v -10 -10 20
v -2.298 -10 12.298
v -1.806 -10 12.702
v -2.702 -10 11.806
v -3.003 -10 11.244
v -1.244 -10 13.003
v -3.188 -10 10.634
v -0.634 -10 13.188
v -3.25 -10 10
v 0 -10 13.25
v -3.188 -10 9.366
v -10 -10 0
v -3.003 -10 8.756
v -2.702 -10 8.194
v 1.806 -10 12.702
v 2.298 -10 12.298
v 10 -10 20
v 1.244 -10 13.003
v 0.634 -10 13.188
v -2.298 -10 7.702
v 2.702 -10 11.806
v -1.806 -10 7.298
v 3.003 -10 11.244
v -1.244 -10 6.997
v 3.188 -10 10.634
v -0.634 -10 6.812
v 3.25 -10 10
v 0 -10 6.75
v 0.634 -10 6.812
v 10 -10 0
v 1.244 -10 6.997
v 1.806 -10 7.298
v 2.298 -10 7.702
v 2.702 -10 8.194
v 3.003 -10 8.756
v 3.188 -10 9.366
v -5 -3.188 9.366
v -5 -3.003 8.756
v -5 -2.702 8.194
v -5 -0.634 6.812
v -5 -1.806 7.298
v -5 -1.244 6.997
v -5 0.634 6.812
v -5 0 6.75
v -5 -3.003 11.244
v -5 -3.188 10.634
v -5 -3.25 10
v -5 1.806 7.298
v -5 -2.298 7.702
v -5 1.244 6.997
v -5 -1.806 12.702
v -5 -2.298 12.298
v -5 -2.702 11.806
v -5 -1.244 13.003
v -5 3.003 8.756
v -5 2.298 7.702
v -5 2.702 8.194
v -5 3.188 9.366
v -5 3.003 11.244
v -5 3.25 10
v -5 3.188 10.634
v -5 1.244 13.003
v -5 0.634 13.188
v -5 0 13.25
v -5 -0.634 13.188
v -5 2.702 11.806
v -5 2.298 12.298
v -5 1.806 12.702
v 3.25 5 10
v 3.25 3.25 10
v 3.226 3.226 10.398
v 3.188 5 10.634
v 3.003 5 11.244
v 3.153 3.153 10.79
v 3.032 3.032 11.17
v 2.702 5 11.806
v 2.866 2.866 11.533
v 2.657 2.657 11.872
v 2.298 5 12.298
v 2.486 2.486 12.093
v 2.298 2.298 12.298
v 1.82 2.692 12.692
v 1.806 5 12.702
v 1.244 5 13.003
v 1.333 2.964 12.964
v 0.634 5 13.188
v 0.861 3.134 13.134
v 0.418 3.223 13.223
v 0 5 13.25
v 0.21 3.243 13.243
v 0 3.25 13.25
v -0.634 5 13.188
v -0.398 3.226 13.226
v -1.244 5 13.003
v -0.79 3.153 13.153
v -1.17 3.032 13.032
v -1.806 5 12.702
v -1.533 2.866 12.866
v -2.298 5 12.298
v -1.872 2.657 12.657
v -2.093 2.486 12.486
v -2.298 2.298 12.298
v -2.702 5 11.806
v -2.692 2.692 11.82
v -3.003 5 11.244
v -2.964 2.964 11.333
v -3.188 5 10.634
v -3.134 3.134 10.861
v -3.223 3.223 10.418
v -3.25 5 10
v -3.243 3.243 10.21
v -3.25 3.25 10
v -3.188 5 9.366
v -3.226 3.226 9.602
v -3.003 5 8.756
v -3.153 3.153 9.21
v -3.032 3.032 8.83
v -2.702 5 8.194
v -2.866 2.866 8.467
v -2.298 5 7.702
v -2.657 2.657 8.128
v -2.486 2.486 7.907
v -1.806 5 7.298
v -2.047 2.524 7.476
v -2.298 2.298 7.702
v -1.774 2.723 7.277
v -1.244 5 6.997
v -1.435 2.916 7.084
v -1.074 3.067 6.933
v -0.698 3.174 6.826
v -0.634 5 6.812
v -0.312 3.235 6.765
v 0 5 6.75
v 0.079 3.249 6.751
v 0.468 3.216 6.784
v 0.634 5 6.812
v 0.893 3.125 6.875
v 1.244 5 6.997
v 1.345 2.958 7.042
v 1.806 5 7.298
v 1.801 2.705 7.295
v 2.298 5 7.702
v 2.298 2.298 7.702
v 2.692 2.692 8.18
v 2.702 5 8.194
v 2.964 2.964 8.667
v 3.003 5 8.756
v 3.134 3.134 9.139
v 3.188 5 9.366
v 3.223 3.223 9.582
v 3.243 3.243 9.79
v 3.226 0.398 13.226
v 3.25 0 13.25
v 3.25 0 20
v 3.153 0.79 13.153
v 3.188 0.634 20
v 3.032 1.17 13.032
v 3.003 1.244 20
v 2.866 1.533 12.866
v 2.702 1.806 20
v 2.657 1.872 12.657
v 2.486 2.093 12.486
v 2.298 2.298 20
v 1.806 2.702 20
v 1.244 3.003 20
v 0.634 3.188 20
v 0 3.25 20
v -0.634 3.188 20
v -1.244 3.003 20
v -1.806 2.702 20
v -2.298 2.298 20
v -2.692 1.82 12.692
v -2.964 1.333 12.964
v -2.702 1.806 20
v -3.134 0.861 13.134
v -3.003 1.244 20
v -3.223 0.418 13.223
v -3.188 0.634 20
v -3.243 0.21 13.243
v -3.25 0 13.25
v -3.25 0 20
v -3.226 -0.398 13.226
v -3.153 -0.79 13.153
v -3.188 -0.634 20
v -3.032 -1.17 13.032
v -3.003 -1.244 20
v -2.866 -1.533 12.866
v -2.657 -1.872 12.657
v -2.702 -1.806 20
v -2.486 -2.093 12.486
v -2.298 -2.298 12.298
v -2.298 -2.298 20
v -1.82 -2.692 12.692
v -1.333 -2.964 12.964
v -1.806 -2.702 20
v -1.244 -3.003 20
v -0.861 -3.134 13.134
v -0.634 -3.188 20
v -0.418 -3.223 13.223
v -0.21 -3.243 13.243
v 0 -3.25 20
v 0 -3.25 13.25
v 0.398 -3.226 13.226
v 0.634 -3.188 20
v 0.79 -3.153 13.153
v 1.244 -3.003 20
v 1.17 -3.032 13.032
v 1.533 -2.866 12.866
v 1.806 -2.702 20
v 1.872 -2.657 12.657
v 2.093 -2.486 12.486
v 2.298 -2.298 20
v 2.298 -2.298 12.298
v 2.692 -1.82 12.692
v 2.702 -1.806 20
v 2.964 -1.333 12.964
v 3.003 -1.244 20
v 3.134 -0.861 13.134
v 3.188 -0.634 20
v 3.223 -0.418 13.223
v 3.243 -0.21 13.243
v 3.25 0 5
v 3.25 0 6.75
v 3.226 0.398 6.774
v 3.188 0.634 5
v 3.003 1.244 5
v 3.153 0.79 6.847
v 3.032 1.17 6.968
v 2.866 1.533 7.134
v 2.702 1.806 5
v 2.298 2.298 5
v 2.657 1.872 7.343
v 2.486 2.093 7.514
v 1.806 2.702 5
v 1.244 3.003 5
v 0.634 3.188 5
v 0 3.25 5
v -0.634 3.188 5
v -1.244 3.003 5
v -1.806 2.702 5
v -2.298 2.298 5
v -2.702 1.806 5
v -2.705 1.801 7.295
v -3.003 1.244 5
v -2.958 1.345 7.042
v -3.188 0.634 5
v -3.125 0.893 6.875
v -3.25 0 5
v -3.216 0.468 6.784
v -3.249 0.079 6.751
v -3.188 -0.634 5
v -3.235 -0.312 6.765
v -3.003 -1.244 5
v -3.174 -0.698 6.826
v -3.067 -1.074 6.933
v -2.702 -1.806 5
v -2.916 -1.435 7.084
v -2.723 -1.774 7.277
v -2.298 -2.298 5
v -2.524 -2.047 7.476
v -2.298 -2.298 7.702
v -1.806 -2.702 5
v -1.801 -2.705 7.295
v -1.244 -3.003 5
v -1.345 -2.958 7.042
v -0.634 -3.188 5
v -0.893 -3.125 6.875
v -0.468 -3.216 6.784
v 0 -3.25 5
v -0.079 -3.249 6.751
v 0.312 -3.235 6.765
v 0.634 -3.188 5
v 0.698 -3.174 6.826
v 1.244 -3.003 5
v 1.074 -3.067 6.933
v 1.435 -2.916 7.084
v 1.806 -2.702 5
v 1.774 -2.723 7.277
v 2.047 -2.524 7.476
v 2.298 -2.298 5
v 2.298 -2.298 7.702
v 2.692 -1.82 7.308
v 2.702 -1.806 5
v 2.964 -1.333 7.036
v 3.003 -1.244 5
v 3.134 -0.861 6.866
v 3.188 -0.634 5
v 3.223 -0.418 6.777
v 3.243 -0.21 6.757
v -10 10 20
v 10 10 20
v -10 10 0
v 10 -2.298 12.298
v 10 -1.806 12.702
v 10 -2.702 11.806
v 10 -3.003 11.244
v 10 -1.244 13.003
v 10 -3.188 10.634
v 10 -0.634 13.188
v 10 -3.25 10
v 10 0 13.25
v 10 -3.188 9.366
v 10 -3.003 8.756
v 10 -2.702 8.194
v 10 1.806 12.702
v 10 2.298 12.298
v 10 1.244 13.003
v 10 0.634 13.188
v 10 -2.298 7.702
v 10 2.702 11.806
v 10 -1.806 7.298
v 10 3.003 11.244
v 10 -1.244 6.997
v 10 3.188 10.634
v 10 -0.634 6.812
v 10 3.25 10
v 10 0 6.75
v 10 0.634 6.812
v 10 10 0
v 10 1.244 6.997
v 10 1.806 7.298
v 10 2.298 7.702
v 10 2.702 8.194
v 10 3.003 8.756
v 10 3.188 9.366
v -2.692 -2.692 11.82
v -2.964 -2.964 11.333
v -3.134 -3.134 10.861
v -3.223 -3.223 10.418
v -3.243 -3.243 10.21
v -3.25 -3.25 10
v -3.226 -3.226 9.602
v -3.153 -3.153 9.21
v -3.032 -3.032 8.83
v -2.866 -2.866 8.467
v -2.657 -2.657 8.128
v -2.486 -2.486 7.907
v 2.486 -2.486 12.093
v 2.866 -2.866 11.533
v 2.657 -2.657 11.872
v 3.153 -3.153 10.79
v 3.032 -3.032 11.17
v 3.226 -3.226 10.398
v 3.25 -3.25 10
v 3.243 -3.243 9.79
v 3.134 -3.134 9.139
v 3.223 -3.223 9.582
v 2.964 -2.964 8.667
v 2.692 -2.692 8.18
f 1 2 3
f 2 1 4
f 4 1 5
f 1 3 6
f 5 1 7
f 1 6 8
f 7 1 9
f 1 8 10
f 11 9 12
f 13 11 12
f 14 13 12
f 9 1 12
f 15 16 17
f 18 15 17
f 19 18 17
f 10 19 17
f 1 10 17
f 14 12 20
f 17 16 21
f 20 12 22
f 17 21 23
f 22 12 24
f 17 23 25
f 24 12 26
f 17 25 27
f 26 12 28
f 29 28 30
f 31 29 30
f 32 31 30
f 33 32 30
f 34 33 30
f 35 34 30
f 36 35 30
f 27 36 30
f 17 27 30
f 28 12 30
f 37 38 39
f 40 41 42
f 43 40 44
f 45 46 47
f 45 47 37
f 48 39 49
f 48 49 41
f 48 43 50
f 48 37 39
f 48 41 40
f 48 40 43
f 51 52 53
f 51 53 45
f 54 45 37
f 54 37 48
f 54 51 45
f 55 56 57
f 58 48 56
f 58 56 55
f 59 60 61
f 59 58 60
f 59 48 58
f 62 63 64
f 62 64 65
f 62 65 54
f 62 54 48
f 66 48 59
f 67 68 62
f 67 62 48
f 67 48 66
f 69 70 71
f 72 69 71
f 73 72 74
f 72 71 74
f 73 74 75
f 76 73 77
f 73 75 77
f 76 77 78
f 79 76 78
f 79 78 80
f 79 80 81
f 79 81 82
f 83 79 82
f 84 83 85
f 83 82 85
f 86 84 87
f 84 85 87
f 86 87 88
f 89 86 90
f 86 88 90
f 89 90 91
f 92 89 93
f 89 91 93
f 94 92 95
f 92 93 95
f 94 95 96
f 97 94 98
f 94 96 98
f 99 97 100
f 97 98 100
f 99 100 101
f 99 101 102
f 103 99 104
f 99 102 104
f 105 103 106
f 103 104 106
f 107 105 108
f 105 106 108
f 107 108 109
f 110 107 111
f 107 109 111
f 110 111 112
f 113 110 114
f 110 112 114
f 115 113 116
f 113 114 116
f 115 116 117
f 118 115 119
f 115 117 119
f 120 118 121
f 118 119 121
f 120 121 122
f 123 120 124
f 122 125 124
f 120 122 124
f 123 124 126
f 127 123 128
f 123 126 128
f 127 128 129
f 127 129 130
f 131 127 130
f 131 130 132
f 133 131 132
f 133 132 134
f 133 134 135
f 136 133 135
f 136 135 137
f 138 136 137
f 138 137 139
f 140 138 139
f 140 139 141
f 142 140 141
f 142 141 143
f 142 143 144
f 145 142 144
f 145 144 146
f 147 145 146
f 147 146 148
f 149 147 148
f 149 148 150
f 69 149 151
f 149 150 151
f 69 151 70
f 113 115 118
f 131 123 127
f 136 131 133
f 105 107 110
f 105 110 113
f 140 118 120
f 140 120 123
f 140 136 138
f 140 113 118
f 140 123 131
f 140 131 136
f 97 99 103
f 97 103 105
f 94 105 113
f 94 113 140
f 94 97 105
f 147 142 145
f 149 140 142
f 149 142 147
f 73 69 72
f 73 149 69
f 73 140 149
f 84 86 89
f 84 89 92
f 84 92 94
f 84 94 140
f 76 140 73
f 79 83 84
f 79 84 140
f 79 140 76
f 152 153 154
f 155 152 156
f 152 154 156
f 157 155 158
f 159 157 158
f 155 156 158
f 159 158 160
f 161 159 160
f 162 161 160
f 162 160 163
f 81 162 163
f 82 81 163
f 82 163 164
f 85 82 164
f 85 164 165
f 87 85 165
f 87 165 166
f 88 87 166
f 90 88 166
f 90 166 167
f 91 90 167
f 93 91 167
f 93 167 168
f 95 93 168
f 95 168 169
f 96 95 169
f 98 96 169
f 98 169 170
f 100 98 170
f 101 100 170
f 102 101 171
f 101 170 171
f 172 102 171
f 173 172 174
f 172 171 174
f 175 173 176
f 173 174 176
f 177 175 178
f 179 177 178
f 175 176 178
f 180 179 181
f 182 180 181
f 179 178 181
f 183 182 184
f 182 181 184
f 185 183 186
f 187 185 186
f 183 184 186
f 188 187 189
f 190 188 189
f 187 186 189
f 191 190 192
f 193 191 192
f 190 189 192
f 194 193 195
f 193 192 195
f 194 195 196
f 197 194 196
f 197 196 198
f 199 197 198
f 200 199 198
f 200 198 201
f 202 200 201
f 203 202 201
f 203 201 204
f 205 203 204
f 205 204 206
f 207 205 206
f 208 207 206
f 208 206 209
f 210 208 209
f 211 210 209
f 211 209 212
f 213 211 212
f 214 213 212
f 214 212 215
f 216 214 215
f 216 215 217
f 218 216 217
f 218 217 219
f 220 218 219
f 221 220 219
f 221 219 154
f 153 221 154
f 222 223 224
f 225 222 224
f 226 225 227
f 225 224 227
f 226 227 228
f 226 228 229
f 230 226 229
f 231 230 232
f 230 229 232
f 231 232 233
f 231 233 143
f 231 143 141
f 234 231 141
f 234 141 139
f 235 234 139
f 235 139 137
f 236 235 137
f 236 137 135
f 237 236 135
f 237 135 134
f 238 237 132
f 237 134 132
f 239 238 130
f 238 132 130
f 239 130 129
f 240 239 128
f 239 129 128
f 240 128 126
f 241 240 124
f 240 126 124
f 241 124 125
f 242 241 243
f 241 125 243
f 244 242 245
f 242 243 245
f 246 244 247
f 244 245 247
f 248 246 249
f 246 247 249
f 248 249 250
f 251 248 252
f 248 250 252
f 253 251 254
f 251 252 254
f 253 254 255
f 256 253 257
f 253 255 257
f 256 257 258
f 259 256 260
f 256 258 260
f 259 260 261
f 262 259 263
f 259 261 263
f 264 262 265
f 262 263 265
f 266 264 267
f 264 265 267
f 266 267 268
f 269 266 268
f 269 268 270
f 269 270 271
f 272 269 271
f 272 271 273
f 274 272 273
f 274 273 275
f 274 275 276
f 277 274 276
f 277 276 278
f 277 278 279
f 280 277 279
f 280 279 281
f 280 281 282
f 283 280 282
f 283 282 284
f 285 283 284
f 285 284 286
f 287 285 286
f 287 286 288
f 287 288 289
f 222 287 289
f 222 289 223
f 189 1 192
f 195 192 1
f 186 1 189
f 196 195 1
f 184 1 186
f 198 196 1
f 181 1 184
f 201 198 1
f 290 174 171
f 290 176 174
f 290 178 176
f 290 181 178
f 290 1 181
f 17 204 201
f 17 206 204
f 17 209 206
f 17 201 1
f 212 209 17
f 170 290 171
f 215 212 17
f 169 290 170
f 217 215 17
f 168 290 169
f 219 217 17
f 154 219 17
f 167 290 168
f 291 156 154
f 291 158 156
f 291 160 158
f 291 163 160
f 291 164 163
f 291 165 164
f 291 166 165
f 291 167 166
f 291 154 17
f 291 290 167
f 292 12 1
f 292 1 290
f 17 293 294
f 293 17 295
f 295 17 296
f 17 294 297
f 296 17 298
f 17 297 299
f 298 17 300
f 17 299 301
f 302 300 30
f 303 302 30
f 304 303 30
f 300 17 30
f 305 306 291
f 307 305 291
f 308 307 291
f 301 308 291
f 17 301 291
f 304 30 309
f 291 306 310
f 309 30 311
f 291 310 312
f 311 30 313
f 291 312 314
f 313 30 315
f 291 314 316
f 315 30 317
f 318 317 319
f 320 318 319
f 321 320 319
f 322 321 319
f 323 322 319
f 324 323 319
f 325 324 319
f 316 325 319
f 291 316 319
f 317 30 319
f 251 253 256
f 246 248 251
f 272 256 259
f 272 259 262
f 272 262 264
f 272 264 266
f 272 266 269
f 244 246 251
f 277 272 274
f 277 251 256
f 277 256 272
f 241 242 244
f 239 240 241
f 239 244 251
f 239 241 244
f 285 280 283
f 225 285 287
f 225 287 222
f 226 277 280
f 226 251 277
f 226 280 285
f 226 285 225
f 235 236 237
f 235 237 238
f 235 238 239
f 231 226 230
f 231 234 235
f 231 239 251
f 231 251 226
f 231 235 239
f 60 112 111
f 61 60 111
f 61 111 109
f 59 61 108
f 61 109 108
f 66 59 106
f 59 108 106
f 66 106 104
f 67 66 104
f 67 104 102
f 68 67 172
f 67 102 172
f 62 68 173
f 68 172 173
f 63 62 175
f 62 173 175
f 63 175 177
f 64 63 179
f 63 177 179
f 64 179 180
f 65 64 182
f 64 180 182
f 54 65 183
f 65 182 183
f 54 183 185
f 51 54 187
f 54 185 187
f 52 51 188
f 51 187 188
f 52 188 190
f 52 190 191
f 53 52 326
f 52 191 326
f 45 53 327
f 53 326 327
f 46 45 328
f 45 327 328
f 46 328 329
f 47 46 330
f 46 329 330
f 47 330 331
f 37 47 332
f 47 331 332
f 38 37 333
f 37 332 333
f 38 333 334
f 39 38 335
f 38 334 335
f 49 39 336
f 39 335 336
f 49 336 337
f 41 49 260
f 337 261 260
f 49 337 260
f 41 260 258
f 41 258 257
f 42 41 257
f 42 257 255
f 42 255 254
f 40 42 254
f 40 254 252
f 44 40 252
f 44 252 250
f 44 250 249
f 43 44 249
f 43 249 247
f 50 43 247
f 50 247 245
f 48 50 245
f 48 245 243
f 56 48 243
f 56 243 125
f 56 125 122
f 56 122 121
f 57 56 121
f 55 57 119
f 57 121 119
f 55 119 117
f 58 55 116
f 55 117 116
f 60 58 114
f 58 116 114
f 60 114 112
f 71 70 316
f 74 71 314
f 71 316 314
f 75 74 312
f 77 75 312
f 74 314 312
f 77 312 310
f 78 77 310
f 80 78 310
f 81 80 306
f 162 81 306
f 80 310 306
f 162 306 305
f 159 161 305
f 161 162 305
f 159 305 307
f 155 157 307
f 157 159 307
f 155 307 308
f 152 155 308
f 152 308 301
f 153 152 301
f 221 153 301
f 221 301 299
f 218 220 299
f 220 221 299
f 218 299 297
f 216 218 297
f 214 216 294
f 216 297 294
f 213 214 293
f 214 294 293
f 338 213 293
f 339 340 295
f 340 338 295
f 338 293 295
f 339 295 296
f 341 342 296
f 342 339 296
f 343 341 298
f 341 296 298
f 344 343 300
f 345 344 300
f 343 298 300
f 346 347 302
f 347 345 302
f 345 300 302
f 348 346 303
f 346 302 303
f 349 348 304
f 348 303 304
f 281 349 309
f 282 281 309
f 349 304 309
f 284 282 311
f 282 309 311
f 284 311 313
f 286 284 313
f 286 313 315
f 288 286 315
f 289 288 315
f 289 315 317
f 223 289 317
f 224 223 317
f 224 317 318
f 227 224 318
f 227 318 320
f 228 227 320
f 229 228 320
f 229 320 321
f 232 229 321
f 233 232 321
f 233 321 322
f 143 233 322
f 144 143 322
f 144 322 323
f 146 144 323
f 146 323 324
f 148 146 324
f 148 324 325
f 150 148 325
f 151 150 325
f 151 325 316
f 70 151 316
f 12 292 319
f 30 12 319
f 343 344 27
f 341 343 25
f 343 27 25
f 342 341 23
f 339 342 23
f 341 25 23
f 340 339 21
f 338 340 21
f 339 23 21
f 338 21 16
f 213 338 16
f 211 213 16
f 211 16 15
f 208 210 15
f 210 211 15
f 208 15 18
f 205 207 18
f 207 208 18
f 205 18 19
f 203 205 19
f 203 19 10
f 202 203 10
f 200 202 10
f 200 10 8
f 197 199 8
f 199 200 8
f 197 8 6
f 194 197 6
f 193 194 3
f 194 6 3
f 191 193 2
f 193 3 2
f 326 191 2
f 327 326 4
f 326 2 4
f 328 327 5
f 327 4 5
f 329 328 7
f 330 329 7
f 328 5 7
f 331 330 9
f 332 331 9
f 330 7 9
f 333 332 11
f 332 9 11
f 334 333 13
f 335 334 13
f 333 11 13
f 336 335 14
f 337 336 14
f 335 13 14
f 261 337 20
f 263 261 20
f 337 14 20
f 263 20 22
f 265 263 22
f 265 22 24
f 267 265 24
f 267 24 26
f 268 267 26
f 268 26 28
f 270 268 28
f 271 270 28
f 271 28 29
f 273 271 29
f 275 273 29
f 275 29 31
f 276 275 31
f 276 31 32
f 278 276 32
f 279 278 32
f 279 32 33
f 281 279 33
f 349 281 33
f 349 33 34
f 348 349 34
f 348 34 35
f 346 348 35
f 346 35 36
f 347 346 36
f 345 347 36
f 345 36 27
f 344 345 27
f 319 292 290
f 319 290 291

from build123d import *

# Parameters (mm, degrees)
F0_W     = 20
F0_H     = 20
F1_DEPTH = 20
F2_R     = 3.25
F3_DEPTH = 15
F4_R     = 3.25
F5_DEPTH = 15
F6_R     = 3.25
F7_DEPTH = 15


with BuildPart() as f1:
    # F0 (on Top) → F1 (new body)
    with BuildSketch(Plane.XY):
        Rectangle(F0_W, F0_H)
    extrude(amount=F1_DEPTH)

    # F2 (on face) → F3 (cut)
    with BuildSketch(Plane.XY.offset(20)):
        Circle(F2_R)
    extrude(amount=-F3_DEPTH, mode=Mode.SUBTRACT)

    # F4 (on face) → F5 (cut)
    with BuildSketch(Plane.XZ.offset(10)):
        with Locations((0, 10)):
            Circle(F4_R)
    extrude(amount=-F5_DEPTH, mode=Mode.SUBTRACT)

    # F6 (on face) → F7 (cut)
    with BuildSketch(Plane.YZ.offset(10)):
        with Locations((0, 10)):
            Circle(F6_R)
    extrude(amount=-F7_DEPTH, mode=Mode.SUBTRACT)


solid = f1.part
